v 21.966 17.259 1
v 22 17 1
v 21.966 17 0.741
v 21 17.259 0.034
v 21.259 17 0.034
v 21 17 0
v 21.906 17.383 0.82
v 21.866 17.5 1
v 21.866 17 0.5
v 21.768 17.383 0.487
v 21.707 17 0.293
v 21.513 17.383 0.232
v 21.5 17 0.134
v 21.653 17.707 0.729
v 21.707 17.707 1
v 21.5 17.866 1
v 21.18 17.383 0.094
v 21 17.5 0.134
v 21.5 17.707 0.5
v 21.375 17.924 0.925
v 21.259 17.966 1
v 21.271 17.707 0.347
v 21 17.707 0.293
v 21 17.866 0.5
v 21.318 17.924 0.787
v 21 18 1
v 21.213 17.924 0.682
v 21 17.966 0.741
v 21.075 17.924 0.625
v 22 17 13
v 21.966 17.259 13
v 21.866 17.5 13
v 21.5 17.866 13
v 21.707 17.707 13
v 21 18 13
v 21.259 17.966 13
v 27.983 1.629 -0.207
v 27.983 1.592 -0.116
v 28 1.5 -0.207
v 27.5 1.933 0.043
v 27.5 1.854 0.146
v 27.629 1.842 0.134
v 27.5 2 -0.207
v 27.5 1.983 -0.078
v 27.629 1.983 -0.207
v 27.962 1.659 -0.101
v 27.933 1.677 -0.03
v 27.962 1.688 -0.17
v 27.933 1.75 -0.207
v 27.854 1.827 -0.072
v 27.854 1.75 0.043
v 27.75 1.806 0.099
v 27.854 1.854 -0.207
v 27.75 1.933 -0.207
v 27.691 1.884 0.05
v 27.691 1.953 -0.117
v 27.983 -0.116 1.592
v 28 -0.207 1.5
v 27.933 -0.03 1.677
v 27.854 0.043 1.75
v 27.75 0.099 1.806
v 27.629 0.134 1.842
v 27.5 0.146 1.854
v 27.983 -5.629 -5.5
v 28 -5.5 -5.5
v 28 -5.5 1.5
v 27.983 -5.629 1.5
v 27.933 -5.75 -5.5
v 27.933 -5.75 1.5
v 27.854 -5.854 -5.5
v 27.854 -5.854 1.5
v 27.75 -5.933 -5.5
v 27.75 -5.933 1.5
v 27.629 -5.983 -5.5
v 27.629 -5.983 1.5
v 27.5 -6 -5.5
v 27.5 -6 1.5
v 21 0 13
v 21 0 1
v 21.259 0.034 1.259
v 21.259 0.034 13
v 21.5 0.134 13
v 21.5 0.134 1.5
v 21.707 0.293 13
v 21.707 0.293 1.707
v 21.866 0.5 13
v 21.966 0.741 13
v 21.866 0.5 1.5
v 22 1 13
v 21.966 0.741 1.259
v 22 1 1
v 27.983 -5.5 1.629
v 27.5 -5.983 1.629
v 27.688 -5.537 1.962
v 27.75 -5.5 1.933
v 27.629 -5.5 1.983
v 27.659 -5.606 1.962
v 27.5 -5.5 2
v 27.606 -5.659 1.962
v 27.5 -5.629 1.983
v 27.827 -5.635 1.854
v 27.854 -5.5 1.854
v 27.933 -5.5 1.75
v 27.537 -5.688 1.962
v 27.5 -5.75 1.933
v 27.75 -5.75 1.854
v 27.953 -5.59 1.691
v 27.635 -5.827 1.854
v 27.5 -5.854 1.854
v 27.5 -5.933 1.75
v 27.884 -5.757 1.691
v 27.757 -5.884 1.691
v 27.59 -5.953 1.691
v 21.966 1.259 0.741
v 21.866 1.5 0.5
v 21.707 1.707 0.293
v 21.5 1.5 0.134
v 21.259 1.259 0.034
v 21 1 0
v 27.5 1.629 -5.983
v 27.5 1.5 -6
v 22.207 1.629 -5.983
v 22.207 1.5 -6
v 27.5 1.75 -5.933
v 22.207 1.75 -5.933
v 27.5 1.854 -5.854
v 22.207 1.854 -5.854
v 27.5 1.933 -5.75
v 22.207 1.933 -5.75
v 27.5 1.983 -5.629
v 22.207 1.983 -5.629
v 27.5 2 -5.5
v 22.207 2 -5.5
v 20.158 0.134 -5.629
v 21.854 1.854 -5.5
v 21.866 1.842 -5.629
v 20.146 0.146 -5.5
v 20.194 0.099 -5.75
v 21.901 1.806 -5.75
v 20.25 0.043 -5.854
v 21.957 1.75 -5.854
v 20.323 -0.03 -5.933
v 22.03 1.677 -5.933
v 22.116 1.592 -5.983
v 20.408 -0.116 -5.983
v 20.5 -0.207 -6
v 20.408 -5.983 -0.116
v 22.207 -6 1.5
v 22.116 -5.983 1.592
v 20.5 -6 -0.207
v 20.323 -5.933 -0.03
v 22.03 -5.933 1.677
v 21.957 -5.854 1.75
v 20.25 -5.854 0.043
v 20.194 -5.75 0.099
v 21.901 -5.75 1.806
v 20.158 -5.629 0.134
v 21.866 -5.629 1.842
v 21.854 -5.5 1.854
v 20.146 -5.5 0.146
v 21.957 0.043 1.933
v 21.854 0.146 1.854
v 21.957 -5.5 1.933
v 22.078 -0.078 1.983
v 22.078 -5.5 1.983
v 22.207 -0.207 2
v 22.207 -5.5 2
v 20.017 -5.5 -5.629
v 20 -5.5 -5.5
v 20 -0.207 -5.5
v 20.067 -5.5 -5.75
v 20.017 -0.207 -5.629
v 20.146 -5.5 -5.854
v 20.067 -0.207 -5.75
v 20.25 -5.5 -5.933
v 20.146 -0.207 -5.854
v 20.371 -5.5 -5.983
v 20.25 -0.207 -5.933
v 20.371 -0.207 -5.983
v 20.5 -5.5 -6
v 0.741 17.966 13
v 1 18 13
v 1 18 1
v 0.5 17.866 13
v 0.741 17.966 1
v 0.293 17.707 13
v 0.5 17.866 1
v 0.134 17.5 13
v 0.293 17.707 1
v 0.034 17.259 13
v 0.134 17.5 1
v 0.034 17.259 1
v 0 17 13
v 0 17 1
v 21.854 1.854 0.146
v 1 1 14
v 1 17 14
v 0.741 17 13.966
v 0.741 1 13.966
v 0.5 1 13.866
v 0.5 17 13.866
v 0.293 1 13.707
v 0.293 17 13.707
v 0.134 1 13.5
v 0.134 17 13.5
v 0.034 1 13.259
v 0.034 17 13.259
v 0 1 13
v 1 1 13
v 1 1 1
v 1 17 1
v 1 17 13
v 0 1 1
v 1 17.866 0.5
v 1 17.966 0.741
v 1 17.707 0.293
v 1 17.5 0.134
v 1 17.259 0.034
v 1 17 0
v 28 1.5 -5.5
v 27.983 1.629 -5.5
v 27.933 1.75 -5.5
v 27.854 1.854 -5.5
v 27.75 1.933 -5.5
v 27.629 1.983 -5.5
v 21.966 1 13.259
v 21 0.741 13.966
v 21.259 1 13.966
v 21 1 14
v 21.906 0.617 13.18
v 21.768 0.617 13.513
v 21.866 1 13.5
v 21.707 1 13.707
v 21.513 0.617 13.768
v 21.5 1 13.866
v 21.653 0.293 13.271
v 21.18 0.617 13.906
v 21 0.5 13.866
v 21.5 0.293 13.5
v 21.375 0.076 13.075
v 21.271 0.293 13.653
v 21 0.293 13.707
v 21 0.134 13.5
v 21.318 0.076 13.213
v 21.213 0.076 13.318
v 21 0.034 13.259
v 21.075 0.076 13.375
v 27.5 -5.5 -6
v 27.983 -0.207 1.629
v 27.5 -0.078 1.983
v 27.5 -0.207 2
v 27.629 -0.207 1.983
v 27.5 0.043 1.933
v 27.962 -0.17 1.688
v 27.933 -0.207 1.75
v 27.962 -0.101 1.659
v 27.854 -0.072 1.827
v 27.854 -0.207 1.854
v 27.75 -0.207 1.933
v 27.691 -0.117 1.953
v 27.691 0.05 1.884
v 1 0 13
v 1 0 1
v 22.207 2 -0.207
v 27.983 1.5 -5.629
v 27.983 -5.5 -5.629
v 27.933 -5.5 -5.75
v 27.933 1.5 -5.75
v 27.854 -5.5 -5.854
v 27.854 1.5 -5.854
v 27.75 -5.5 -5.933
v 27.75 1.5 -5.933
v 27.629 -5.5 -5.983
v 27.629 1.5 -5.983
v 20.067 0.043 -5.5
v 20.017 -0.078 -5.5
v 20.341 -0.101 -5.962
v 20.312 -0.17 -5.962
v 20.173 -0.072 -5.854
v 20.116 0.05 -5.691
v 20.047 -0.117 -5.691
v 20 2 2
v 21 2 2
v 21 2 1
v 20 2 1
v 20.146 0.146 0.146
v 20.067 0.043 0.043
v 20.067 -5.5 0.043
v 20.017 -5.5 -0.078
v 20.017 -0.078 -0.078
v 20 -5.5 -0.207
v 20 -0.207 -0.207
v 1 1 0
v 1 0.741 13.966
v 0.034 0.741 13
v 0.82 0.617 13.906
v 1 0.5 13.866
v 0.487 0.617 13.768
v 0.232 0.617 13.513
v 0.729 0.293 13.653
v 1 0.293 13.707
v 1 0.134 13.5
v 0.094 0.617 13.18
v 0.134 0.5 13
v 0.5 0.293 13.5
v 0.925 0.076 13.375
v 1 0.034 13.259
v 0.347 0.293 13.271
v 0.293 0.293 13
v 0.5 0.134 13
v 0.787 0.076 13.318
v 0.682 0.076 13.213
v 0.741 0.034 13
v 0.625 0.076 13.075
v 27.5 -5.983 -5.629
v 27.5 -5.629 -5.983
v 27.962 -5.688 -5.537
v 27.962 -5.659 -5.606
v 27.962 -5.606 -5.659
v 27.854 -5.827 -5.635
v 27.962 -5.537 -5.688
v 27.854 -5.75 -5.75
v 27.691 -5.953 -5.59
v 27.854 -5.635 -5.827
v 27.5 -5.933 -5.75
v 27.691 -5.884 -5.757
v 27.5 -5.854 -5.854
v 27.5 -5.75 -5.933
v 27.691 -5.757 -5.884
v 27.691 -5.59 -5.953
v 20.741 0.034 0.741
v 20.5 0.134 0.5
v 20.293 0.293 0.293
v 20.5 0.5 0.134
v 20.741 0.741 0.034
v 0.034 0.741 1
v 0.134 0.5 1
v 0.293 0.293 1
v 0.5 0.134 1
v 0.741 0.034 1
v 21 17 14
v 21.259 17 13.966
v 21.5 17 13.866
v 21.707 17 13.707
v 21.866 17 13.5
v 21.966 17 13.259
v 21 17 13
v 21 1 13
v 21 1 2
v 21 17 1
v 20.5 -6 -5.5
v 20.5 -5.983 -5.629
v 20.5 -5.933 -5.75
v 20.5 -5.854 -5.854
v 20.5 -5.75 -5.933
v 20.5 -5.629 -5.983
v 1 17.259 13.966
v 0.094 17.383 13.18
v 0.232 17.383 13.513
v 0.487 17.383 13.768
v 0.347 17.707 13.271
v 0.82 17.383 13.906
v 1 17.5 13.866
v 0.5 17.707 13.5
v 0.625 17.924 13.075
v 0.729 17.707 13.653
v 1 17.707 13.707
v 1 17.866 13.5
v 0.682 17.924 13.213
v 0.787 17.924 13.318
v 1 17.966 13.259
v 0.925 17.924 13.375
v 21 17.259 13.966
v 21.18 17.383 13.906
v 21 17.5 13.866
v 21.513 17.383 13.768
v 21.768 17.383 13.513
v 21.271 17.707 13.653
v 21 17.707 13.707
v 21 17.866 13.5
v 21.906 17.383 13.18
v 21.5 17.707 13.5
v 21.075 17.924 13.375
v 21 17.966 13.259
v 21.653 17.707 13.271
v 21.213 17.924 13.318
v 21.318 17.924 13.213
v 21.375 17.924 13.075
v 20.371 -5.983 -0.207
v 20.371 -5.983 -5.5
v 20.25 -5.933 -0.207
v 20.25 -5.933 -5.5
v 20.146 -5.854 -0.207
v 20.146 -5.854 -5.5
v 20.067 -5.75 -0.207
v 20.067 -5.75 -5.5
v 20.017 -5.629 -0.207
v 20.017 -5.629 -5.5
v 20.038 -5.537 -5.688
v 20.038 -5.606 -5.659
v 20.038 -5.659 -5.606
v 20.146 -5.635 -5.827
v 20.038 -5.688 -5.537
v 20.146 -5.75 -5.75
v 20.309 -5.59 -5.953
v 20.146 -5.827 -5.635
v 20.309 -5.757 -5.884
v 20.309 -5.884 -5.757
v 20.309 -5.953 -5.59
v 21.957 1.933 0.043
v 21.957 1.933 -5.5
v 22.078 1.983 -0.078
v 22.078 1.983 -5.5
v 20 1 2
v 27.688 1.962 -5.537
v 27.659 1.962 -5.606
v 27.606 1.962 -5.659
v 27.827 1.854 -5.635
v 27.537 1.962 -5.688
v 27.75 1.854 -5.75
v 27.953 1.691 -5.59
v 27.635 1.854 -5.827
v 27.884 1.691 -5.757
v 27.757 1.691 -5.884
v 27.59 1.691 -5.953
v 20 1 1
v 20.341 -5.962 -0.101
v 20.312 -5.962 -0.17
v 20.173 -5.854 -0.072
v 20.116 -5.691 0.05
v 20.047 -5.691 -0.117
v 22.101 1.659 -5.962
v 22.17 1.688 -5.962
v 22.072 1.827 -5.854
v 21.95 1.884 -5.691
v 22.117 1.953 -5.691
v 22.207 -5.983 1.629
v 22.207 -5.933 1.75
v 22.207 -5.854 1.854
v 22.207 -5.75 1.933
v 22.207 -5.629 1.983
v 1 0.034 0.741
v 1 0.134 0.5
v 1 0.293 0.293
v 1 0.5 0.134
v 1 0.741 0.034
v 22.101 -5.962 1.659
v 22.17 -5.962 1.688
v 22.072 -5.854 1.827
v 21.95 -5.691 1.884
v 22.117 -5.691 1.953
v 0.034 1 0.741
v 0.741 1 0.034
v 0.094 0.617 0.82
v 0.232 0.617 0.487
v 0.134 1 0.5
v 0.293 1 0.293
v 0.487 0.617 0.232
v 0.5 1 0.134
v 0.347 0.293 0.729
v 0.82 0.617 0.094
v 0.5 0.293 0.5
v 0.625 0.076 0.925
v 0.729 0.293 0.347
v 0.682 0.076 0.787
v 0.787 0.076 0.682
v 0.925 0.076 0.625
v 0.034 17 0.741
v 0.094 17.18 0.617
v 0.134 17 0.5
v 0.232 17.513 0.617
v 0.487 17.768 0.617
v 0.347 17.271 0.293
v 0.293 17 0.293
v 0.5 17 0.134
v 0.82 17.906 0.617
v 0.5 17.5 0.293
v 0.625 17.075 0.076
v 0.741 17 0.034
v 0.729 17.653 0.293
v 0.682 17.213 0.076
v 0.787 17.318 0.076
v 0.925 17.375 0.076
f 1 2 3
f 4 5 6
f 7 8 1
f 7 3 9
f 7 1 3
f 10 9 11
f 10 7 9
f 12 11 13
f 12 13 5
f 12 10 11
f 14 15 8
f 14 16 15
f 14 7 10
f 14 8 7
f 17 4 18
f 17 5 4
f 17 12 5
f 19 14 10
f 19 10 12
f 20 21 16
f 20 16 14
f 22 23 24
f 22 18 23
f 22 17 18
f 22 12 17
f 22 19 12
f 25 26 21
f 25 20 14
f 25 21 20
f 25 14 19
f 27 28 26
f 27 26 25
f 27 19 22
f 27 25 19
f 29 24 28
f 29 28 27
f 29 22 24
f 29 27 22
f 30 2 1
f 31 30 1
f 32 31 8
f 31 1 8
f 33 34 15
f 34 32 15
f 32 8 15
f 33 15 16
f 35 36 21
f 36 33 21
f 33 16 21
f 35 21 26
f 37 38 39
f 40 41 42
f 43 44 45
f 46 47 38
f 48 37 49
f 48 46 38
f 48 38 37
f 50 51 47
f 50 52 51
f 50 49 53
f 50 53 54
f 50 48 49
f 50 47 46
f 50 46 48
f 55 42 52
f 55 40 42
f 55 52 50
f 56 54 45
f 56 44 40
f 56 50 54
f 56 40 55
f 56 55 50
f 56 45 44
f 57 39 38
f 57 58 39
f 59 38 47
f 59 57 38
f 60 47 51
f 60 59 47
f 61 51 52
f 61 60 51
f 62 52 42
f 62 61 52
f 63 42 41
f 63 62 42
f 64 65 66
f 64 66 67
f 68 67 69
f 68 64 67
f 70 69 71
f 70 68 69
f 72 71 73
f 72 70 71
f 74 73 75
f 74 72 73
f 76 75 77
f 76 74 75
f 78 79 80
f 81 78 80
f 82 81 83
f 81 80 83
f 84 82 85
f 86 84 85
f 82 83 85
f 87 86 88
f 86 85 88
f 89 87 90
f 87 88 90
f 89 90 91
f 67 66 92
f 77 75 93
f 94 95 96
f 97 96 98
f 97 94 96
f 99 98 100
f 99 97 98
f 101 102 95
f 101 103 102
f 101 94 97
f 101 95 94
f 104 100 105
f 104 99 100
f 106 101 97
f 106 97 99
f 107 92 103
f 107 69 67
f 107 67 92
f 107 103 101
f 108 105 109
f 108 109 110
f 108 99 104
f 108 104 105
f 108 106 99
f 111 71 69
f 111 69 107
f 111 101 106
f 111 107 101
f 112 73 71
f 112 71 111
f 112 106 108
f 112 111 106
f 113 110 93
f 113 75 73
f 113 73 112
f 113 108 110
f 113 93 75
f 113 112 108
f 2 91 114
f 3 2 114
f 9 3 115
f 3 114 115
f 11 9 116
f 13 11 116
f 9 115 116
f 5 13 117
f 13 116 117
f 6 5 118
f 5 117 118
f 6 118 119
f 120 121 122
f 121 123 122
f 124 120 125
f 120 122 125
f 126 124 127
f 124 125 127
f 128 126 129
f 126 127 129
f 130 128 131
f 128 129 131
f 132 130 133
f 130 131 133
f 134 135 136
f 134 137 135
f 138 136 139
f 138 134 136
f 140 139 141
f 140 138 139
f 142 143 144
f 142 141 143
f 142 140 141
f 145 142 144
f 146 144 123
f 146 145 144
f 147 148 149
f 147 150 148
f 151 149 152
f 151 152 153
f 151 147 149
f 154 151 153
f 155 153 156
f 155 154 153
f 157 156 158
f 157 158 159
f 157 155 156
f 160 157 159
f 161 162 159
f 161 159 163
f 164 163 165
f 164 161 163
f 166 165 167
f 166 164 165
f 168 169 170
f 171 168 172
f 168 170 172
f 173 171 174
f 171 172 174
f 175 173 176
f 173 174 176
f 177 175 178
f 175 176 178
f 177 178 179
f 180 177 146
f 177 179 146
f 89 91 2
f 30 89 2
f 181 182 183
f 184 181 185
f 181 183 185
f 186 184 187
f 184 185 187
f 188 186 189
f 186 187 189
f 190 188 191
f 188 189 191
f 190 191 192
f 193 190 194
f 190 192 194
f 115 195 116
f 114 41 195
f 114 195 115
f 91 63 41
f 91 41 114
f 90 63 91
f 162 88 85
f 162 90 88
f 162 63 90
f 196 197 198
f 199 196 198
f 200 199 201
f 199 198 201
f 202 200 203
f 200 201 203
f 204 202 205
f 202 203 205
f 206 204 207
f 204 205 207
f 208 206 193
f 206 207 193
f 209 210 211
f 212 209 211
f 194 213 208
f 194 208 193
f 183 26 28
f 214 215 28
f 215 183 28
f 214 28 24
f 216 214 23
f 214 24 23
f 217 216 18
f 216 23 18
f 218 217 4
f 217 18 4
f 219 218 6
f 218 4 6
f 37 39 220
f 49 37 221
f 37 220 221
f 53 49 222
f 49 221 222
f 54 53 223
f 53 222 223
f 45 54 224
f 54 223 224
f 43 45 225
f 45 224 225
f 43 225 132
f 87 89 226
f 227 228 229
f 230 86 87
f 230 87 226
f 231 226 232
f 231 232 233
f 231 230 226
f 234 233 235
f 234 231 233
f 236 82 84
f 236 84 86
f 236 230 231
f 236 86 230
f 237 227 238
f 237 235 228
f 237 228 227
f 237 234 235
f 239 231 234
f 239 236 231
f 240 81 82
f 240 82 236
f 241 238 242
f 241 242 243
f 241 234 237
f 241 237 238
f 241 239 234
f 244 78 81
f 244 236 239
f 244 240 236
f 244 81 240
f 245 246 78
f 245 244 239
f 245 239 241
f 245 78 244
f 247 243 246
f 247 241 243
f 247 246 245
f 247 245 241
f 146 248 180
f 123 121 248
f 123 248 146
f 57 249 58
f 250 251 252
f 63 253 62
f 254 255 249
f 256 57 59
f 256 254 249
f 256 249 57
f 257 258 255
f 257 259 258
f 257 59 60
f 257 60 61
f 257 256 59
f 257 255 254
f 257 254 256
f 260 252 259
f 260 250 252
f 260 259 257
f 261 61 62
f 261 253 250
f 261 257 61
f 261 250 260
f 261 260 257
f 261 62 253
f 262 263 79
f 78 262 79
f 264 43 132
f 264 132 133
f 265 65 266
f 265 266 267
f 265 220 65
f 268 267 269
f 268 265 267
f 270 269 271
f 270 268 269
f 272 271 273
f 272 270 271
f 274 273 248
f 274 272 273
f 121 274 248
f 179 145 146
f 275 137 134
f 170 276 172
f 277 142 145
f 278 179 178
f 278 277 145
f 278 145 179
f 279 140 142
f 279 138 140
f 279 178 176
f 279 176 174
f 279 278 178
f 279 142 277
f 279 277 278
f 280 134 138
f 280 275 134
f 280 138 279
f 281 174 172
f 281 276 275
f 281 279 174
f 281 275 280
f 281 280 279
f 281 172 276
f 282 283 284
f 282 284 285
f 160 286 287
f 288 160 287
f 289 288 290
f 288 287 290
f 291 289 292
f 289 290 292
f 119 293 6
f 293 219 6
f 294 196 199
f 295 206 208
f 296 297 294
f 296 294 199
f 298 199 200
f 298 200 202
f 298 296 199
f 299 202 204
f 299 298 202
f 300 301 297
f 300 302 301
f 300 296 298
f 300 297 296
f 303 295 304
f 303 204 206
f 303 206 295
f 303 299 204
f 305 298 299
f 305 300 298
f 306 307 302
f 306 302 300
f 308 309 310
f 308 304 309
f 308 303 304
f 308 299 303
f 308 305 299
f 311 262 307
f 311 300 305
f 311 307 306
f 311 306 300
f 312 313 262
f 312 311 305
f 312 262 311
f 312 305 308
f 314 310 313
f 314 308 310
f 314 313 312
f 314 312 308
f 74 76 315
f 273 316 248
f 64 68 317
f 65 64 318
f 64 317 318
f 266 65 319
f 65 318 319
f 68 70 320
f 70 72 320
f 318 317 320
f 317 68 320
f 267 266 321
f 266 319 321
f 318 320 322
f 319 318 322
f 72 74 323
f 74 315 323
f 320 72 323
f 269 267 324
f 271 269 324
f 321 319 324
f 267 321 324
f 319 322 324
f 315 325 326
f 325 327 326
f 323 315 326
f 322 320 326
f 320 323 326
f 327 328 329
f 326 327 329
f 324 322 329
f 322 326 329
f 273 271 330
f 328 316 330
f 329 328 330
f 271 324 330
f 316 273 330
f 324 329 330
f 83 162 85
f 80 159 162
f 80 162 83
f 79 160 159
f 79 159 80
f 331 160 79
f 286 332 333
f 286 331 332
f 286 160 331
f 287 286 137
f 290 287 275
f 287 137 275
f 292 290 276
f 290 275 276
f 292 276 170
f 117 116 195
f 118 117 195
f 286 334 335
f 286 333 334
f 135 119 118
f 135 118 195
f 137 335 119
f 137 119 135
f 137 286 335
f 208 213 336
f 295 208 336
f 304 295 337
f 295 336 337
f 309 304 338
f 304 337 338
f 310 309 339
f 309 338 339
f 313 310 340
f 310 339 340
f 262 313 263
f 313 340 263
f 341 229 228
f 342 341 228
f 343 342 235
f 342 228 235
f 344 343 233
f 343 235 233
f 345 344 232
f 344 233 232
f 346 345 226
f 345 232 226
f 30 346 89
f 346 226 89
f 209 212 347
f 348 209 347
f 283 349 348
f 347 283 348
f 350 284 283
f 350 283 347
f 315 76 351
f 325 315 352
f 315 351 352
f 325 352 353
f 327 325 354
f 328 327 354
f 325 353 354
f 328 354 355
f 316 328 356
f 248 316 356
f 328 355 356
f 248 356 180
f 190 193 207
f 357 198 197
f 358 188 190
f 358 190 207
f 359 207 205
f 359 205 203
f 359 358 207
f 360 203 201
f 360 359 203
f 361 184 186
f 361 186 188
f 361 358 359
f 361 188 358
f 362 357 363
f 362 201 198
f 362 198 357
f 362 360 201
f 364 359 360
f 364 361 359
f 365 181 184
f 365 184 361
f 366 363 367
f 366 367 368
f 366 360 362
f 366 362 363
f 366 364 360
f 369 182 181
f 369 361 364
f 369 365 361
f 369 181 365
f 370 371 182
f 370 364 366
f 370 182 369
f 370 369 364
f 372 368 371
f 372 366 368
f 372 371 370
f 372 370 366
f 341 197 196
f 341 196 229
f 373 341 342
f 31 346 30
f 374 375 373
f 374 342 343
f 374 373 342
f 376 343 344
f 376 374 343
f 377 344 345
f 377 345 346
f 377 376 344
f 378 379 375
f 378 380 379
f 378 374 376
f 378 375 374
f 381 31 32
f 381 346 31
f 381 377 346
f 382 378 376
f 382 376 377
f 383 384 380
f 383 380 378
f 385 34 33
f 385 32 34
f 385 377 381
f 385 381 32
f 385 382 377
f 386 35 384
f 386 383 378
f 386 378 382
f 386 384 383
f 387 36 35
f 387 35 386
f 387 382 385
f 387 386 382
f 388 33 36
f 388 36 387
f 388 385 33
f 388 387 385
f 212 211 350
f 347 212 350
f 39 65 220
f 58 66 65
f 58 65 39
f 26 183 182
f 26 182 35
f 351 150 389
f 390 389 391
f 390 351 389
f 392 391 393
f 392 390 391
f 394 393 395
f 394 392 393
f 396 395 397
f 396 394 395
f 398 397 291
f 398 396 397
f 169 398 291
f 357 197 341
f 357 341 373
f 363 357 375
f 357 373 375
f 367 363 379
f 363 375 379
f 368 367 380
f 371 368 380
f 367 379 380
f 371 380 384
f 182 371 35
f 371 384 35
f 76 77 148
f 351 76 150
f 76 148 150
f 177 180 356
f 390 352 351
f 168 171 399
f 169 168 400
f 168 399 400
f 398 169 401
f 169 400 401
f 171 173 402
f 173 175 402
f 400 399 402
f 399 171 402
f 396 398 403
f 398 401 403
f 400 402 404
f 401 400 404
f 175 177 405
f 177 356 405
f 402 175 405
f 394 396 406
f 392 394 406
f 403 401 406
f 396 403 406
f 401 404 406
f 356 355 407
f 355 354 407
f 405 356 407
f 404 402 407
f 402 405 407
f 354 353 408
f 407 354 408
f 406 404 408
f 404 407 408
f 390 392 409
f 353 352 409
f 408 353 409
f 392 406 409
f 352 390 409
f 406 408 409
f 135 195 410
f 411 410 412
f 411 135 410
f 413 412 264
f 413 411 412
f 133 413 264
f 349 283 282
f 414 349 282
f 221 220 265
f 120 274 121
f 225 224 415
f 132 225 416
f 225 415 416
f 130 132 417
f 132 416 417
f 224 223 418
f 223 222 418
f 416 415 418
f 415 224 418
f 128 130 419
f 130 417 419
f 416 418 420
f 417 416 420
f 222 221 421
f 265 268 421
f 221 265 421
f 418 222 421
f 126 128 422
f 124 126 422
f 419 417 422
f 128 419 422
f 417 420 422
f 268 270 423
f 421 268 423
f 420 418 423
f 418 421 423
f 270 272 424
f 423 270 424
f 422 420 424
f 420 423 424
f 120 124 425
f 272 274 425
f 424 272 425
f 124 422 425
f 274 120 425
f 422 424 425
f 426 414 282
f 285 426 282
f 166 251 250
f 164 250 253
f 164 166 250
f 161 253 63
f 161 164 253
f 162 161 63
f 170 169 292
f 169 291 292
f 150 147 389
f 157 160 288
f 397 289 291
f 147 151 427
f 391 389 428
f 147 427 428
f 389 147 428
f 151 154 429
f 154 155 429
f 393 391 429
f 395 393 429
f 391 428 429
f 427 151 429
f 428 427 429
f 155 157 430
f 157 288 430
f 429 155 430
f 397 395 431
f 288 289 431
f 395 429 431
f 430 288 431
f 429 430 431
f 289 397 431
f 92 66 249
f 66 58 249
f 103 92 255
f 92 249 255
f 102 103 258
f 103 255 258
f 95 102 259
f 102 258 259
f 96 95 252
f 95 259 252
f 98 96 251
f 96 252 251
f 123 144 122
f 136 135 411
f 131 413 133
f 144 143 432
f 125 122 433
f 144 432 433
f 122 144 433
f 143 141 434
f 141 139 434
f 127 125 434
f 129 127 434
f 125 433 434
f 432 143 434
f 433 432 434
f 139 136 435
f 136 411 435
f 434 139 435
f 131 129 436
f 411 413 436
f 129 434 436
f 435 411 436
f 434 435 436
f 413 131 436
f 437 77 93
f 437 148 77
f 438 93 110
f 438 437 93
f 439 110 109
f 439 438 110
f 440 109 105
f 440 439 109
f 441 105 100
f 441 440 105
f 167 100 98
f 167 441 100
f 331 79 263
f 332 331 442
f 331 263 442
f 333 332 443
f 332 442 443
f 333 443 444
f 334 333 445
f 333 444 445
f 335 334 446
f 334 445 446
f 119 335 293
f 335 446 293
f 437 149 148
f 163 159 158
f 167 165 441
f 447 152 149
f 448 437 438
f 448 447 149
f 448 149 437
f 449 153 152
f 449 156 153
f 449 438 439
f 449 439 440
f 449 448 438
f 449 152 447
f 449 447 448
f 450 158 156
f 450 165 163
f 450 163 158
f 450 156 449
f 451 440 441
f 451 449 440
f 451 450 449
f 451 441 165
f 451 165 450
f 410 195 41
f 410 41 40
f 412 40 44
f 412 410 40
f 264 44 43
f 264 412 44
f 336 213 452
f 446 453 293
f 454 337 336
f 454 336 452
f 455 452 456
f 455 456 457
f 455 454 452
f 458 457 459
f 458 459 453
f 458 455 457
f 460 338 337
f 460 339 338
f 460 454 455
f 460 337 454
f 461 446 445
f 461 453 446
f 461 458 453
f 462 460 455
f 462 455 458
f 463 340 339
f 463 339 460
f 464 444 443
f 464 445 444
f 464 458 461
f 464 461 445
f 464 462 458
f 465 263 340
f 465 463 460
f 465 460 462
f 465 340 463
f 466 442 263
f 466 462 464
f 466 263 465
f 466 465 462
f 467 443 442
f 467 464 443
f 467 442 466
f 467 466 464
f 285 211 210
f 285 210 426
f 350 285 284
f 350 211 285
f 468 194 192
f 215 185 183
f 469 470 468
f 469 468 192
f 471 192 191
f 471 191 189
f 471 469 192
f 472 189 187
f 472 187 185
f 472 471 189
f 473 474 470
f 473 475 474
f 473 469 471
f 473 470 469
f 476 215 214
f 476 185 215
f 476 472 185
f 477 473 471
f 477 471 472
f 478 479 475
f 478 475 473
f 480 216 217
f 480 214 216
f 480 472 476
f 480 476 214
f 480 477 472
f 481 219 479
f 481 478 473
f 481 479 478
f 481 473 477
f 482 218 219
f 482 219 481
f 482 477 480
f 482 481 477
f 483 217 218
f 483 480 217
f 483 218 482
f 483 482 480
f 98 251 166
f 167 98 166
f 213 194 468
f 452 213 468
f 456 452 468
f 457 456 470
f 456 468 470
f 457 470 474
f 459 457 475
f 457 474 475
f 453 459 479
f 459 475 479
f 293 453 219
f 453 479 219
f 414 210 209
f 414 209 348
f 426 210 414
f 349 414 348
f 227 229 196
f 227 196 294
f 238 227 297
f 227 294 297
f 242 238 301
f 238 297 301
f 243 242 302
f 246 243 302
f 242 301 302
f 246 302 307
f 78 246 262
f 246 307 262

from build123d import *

# Parameters (mm, degrees)
SKETCH1_W                = 22
SKETCH1_H                = 18
BOSS_EXTRUDE1_DEPTH      = 14
SHELL1_T                 = 1
BOSS_EXTRUDE3_DEPTH      = 6
BOSS_EXTRUDE3_DEPTH_BACK = 2
SKETCH2_W                = 8
SKETCH2_H                = 8
CHAMFER2_SIZE            = 2
FILLET1_R                = 1
FILLET2_R                = 0.5


with BuildPart() as part:
    # Sketch1 → Boss-Extrude1 (new body)
    with BuildSketch(Plane.XY):
        with Locations((11, 9)):
            Rectangle(SKETCH1_W, SKETCH1_H)
    extrude(amount=BOSS_EXTRUDE1_DEPTH)

    # Shell1 (no face opened: a closed hollow body)
    add(offset(amount=-SHELL1_T, mode=Mode.PRIVATE), mode=Mode.SUBTRACT)

    # Sketch2 → Boss-Extrude3 (add, two sides: drawn at the far end of the back side and taken through both)
    with BuildSketch(Plane(origin=(0, 0, 0), x_dir=(-1, 0, 0), z_dir=(0, 0, -1)).offset(-BOSS_EXTRUDE3_DEPTH_BACK)):
        with Locations((-24, -2)):
            Rectangle(SKETCH2_W, SKETCH2_H)
    extrude(amount=BOSS_EXTRUDE3_DEPTH + BOSS_EXTRUDE3_DEPTH_BACK)

    # Chamfer2
    chamfer2_edges = [part.edges().sort_by_distance(p)[0] for p in [
        (20, -3, 2),
        (20, 2, -3),
        (25, 2, 2),
    ]]
    chamfer(chamfer2_edges, length=CHAMFER2_SIZE)

    # Fillet1
    # the kernel refuses this fillet: 1 mm, written as the material it takes off along each edge
    with BuildSketch(Plane(origin=(1, 17, 1), x_dir=(0, 1, 0), z_dir=(0, 0, -1))) as fillet1_piece_1_section:
        Polygon((0, 0), (FILLET1_R, 0), (FILLET1_R, -FILLET1_R), (0, -FILLET1_R), align=None)
    fillet1_piece_1 = extrude(amount=FILLET1_R, mode=Mode.PRIVATE)
    fillet1_piece_1 = fillet1_piece_1 - Plane(origin=(1, 17, 1), x_dir=(0.7071067811865476, -0.7071067811865474, 0), z_dir=(0, 0, -1)) * Sphere(FILLET1_R, mode=Mode.PRIVATE)
    add(fillet1_piece_1, mode=Mode.SUBTRACT)
    with BuildSketch(Plane(origin=(1, 1, 1), x_dir=(0, 0, -1), z_dir=(0, -1, 0))) as fillet1_piece_2_section:
        Polygon((0, 0), (FILLET1_R, 0), (FILLET1_R, -FILLET1_R), (0, -FILLET1_R), align=None)
    fillet1_piece_2 = extrude(amount=FILLET1_R, mode=Mode.PRIVATE)
    fillet1_piece_2 = fillet1_piece_2 - Plane(origin=(1, 1, 1), x_dir=(0.7071067811865475, 0, 0.7071067811865475), z_dir=(0, -1, 0)) * Sphere(FILLET1_R, mode=Mode.PRIVATE)
    add(fillet1_piece_2, mode=Mode.SUBTRACT)
    with BuildSketch(Plane(origin=(21, 17, 1), x_dir=(0, 0, -1), z_dir=(0, 1, 0))) as fillet1_piece_3_section:
        Polygon((0, 0), (FILLET1_R, 0), (FILLET1_R, -FILLET1_R), (0, -FILLET1_R), align=None)
    fillet1_piece_3 = extrude(amount=FILLET1_R, mode=Mode.PRIVATE)
    fillet1_piece_3 = fillet1_piece_3 - Plane(origin=(21, 17, 1), x_dir=(-0.7071067811865475, 0, 0.7071067811865475), z_dir=(0, 1, 0)) * Sphere(FILLET1_R, mode=Mode.PRIVATE)
    add(fillet1_piece_3, mode=Mode.SUBTRACT)
    with BuildSketch(Plane(origin=(1, 1, 13), x_dir=(-1, 0, 0), z_dir=(0, -1, 0))) as fillet1_piece_4_section:
        Polygon((0, 0), (FILLET1_R, 0), (FILLET1_R, -FILLET1_R), (0, -FILLET1_R), align=None)
    fillet1_piece_4 = extrude(amount=FILLET1_R, mode=Mode.PRIVATE)
    fillet1_piece_4 = fillet1_piece_4 - Plane(origin=(1, 1, 13), x_dir=(0.7071067811865475, 0, -0.7071067811865475), z_dir=(0, -1, 0)) * Sphere(FILLET1_R, mode=Mode.PRIVATE)
    add(fillet1_piece_4, mode=Mode.SUBTRACT)
    with BuildSketch(Plane(origin=(21, 1, 13), x_dir=(1, 0, 0), z_dir=(0, -1, 0))) as fillet1_piece_5_section:
        Polygon((0, 0), (FILLET1_R, 0), (FILLET1_R, FILLET1_R), (0, FILLET1_R), align=None)
    fillet1_piece_5 = extrude(amount=FILLET1_R, mode=Mode.PRIVATE)
    fillet1_piece_5 = fillet1_piece_5 - Plane(origin=(21, 1, 13), x_dir=(-0.7071067811865475, 0, -0.7071067811865475), z_dir=(0, -1, 0)) * Sphere(FILLET1_R, mode=Mode.PRIVATE)
    add(fillet1_piece_5, mode=Mode.SUBTRACT)
    with BuildSketch(Plane(origin=(21, 17, 13), x_dir=(1, 0, 0), z_dir=(0, 1, 0))) as fillet1_piece_6_section:
        Polygon((0, 0), (FILLET1_R, 0), (FILLET1_R, -FILLET1_R), (0, -FILLET1_R), align=None)
    fillet1_piece_6 = extrude(amount=FILLET1_R, mode=Mode.PRIVATE)
    fillet1_piece_6 = fillet1_piece_6 - Plane(origin=(21, 17, 13), x_dir=(-0.7071067811865475, 0, -0.7071067811865475), z_dir=(0, 1, 0)) * Sphere(FILLET1_R, mode=Mode.PRIVATE)
    add(fillet1_piece_6, mode=Mode.SUBTRACT)
    with BuildSketch(Plane(origin=(1, 17, 13), x_dir=(-1, 0, 0), z_dir=(0, 1, 0))) as fillet1_piece_7_section:
        Polygon((0, 0), (FILLET1_R, 0), (FILLET1_R, FILLET1_R), (0, FILLET1_R), align=None)
    fillet1_piece_7 = extrude(amount=FILLET1_R, mode=Mode.PRIVATE)
    fillet1_piece_7 = fillet1_piece_7 - Plane(origin=(1, 17, 13), x_dir=(0.7071067811865475, 0, -0.7071067811865475), z_dir=(0, 1, 0)) * Sphere(FILLET1_R, mode=Mode.PRIVATE)
    add(fillet1_piece_7, mode=Mode.SUBTRACT)
    with BuildSketch(Plane(origin=(0, 17, 0), x_dir=(1, 0, 0), z_dir=(0, -1, 0)), Plane(origin=(22, 1, 14), x_dir=(0, 0, -1), z_dir=(0, 1, 0)), Plane(origin=(0, 17, 14), x_dir=(0, 0, -1), z_dir=(0, -1, 0))) as fillet1_piece_8:
        with BuildLine():
            CenterArc((FILLET1_R, FILLET1_R), FILLET1_R, 180, 90)
            Line((0, FILLET1_R), (0, 0))
            Line((0, 0), (FILLET1_R, 0))
        make_face()
    extrude(amount=16, mode=Mode.SUBTRACT)
    with BuildSketch(Plane(origin=(1, 0, 0), x_dir=(0, 0, 1), z_dir=(1, 0, 0))) as fillet1_piece_9_section:
        with BuildLine():
            CenterArc((FILLET1_R, -FILLET1_R), FILLET1_R, 90, 90)
            Line((0, -FILLET1_R), (0, 0))
            Line((0, 0), (FILLET1_R, 0))
        make_face()
    fillet1_piece_9 = extrude(amount=21.5, mode=Mode.PRIVATE)
    fillet1_piece_9 = split(fillet1_piece_9, bisect_by=Plane(origin=(15.381840504, 0.226418621, -4.618159496), z_dir=(-0.7071067811865476, 0, 0.7071067811865476)), keep=Keep.TOP, mode=Mode.PRIVATE)
    fillet1_piece_9 = split(fillet1_piece_9, bisect_by=Plane(origin=(15.381840504, -4.618159496, 0.226418621), z_dir=(-0.7071067811865476, 0.7071067811865476, 0)), keep=Keep.TOP, mode=Mode.PRIVATE)
    add(fillet1_piece_9, mode=Mode.SUBTRACT)
    with BuildSketch(Plane(origin=(1, 0, 0), x_dir=(0, 0, 1), z_dir=(1, 0, 0))) as fillet1_piece_10_section:
        with BuildLine():
            CenterArc((FILLET1_R, -FILLET1_R), FILLET1_R, 90, 90)
            Line((0, -FILLET1_R), (0, 0))
            Line((0, 0), (FILLET1_R, 0))
        make_face()
    fillet1_piece_10 = extrude(amount=21.5, mode=Mode.PRIVATE)
    fillet1_piece_10 = split(fillet1_piece_10, bisect_by=Plane(origin=(20.16446835, 0.528927527, 0.16446835), z_dir=(0.7071067811865476, 0, -0.7071067811865476)), keep=Keep.TOP, mode=Mode.PRIVATE)
    fillet1_piece_10 = split(fillet1_piece_10, bisect_by=Plane(origin=(20.407441135, 0.407441135, 0.042981958), z_dir=(-0.7071067811865476, 0.7071067811865476, 0)), keep=Keep.TOP, mode=Mode.PRIVATE)
    add(fillet1_piece_10, mode=Mode.SUBTRACT)
    with BuildSketch(Plane(origin=(1, 0, 0), x_dir=(0, 0, 1), z_dir=(1, 0, 0))) as fillet1_piece_11_section:
        with BuildLine():
            CenterArc((FILLET1_R, -FILLET1_R), FILLET1_R, 90, 90)
            Line((0, -FILLET1_R), (0, 0))
            Line((0, 0), (FILLET1_R, 0))
        make_face()
    fillet1_piece_11 = extrude(amount=21.5, mode=Mode.PRIVATE)
    fillet1_piece_11 = split(fillet1_piece_11, bisect_by=Plane(origin=(20.407441135, 0.042981958, 0.407441135), z_dir=(-0.7071067811865476, 0, 0.7071067811865476)), keep=Keep.TOP, mode=Mode.PRIVATE)
    fillet1_piece_11 = split(fillet1_piece_11, bisect_by=Plane(origin=(20.16446835, 0.16446835, 0.528927527), z_dir=(0.7071067811865476, -0.7071067811865476, 0)), keep=Keep.TOP, mode=Mode.PRIVATE)
    add(fillet1_piece_11, mode=Mode.SUBTRACT)
    with BuildSketch(Plane(origin=(22, -0.5, 0), x_dir=(-1, 0, 0), z_dir=(0, 1, 0))) as fillet1_piece_12_section:
        with BuildLine():
            CenterArc((FILLET1_R, FILLET1_R), FILLET1_R, 180, 90)
            Line((0, FILLET1_R), (0, 0))
            Line((0, 0), (FILLET1_R, 0))
        make_face()
    fillet1_piece_12 = extrude(amount=17.5, mode=Mode.PRIVATE)
    fillet1_piece_12 = split(fillet1_piece_12, bisect_by=Plane(origin=(21.83553165, 1.83553165, 0.528927527), z_dir=(0.7071067811865476, -0.7071067811865476, 0)), keep=Keep.TOP, mode=Mode.PRIVATE)
    fillet1_piece_12 = split(fillet1_piece_12, bisect_by=Plane(origin=(21.957018042, 1.592558865, 0.407441135), z_dir=(0, 0.7071067811865476, 0.7071067811865476)), keep=Keep.TOP, mode=Mode.PRIVATE)
    add(fillet1_piece_12, mode=Mode.SUBTRACT)
    with BuildSketch(Plane(origin=(22, -0.5, 0), x_dir=(-1, 0, 0), z_dir=(0, 1, 0))) as fillet1_piece_13_section:
        with BuildLine():
            CenterArc((FILLET1_R, FILLET1_R), FILLET1_R, 180, 90)
            Line((0, FILLET1_R), (0, 0))
            Line((0, 0), (FILLET1_R, 0))
        make_face()
    fillet1_piece_13 = extrude(amount=17.5, mode=Mode.PRIVATE)
    fillet1_piece_13 = split(fillet1_piece_13, bisect_by=Plane(origin=(21.592558865, 1.592558865, 0.042981958), z_dir=(-0.7071067811865476, 0.7071067811865476, 0)), keep=Keep.TOP, mode=Mode.PRIVATE)
    fillet1_piece_13 = split(fillet1_piece_13, bisect_by=Plane(origin=(21.471072473, 1.83553165, 0.16446835), z_dir=(0, -0.7071067811865476, -0.7071067811865476)), keep=Keep.TOP, mode=Mode.PRIVATE)
    add(fillet1_piece_13, mode=Mode.SUBTRACT)
    with BuildSketch(Plane(origin=(22, -0.5, 0), x_dir=(-1, 0, 0), z_dir=(0, 1, 0))) as fillet1_piece_14_section:
        with BuildLine():
            CenterArc((FILLET1_R, FILLET1_R), FILLET1_R, 180, 90)
            Line((0, FILLET1_R), (0, 0))
            Line((0, 0), (FILLET1_R, 0))
        make_face()
    fillet1_piece_14 = extrude(amount=17.5, mode=Mode.PRIVATE)
    fillet1_piece_14 = split(fillet1_piece_14, bisect_by=Plane(origin=(25.618138272, 5.618138272, 0.226424858), z_dir=(-0.7071067811865476, 0.7071067811865476, 0)), keep=Keep.TOP, mode=Mode.PRIVATE)
    fillet1_piece_14 = split(fillet1_piece_14, bisect_by=Plane(origin=(21.773575142, 5.618138272, -3.618138272), z_dir=(0, 0.7071067811865476, 0.7071067811865476)), keep=Keep.TOP, mode=Mode.PRIVATE)
    add(fillet1_piece_14, mode=Mode.SUBTRACT)
    with BuildSketch(Plane(origin=(21, 18, 0), x_dir=(0, -1, 0), z_dir=(-1, 0, 0)), Plane(origin=(1, 0, 14), x_dir=(0, 0, -1), z_dir=(1, 0, 0))) as fillet1_piece_15:
        with BuildLine():
            CenterArc((FILLET1_R, FILLET1_R), FILLET1_R, 180, 90)
            Line((0, FILLET1_R), (0, 0))
            Line((0, 0), (FILLET1_R, 0))
        make_face()
    extrude(amount=20, mode=Mode.SUBTRACT)
    with BuildSketch(Plane(origin=(21, 18, 14), x_dir=(0, -1, 0), z_dir=(-1, 0, 0))) as fillet1_piece_16:
        with BuildLine():
            CenterArc((FILLET1_R, -FILLET1_R), FILLET1_R, 90, 90)
            Line((0, -FILLET1_R), (0, 0))
            Line((0, 0), (FILLET1_R, 0))
        make_face()
    extrude(amount=20, mode=Mode.SUBTRACT)
    with BuildSketch(Plane(origin=(0, 18, 1), x_dir=(0, -1, 0), z_dir=(0, 0, 1)), Plane(origin=(0, 0, 1), x_dir=(1, 0, 0), z_dir=(0, 0, 1))) as fillet1_piece_17:
        with BuildLine():
            CenterArc((FILLET1_R, FILLET1_R), FILLET1_R, 180, 90)
            Line((0, FILLET1_R), (0, 0))
            Line((0, 0), (FILLET1_R, 0))
        make_face()
    extrude(amount=12, mode=Mode.SUBTRACT)
    with BuildSketch(Plane(origin=(22, 18, 1), x_dir=(0, -1, 0), z_dir=(0, 0, 1))) as fillet1_piece_18:
        with BuildLine():
            CenterArc((FILLET1_R, -FILLET1_R), FILLET1_R, 90, 90)
            Line((0, -FILLET1_R), (0, 0))
            Line((0, 0), (FILLET1_R, 0))
        make_face()
    extrude(amount=12, mode=Mode.SUBTRACT)
    with BuildSketch(Plane(origin=(22, 0, -0.5), x_dir=(-1, 0, 0), z_dir=(0, 0, 1))) as fillet1_piece_19_section:
        with BuildLine():
            CenterArc((FILLET1_R, -FILLET1_R), FILLET1_R, 90, 90)
            Line((0, -FILLET1_R), (0, 0))
            Line((0, 0), (FILLET1_R, 0))
        make_face()
    fillet1_piece_19 = extrude(amount=13.5, mode=Mode.PRIVATE)
    fillet1_piece_19 = split(fillet1_piece_19, bisect_by=Plane(origin=(21.83553165, 0.528927527, 1.83553165), z_dir=(0.7071067811865476, 0, -0.7071067811865476)), keep=Keep.TOP, mode=Mode.PRIVATE)
    fillet1_piece_19 = split(fillet1_piece_19, bisect_by=Plane(origin=(21.957018042, 0.407441135, 1.592558865), z_dir=(0, 0.7071067811865476, 0.7071067811865476)), keep=Keep.TOP, mode=Mode.PRIVATE)
    add(fillet1_piece_19, mode=Mode.SUBTRACT)
    with BuildSketch(Plane(origin=(22, 0, -0.5), x_dir=(-1, 0, 0), z_dir=(0, 0, 1))) as fillet1_piece_20_section:
        with BuildLine():
            CenterArc((FILLET1_R, -FILLET1_R), FILLET1_R, 90, 90)
            Line((0, -FILLET1_R), (0, 0))
            Line((0, 0), (FILLET1_R, 0))
        make_face()
    fillet1_piece_20 = extrude(amount=13.5, mode=Mode.PRIVATE)
    fillet1_piece_20 = split(fillet1_piece_20, bisect_by=Plane(origin=(21.592558865, 0.042981958, 1.592558865), z_dir=(-0.7071067811865476, 0, 0.7071067811865476)), keep=Keep.TOP, mode=Mode.PRIVATE)
    fillet1_piece_20 = split(fillet1_piece_20, bisect_by=Plane(origin=(21.471072473, 0.16446835, 1.83553165), z_dir=(0, -0.7071067811865476, -0.7071067811865476)), keep=Keep.TOP, mode=Mode.PRIVATE)
    add(fillet1_piece_20, mode=Mode.SUBTRACT)
    with BuildSketch(Plane(origin=(22, 0, -0.5), x_dir=(-1, 0, 0), z_dir=(0, 0, 1))) as fillet1_piece_21_section:
        with BuildLine():
            CenterArc((FILLET1_R, -FILLET1_R), FILLET1_R, 90, 90)
            Line((0, -FILLET1_R), (0, 0))
            Line((0, 0), (FILLET1_R, 0))
        make_face()
    fillet1_piece_21 = extrude(amount=13.5, mode=Mode.PRIVATE)
    fillet1_piece_21 = split(fillet1_piece_21, bisect_by=Plane(origin=(24.618101716, 0.226435602, 4.618101716), z_dir=(-0.7071067811865476, 0, 0.7071067811865476)), keep=Keep.TOP, mode=Mode.PRIVATE)
    fillet1_piece_21 = split(fillet1_piece_21, bisect_by=Plane(origin=(21.773564398, -2.618101716, 4.618101716), z_dir=(0, 0.7071067811865476, 0.7071067811865476)), keep=Keep.TOP, mode=Mode.PRIVATE)
    add(fillet1_piece_21, mode=Mode.SUBTRACT)

    # Fillet2
    fillet2_edges = [part.edges().sort_by_distance(p)[0] for p in [
        (24, -6, -6),
        (28, -6, -2),
        (28, -2, -6),
        (28, 2, -3),
        (25, 2, -6),
        (22, 2, -3),
        (25, 2, 0),
        (28, -3, 2),
        (28, 1, 1),
        (25, -6, 2),
        (22, -3, 2),
        (25, 0, 2),
        (20, -3, -6),
        (20, -6, -3),
        (20, -3, 0),
        (20, 0, -3),
        (21, 1, -6),
        (21, -6, 1),
    ]]
    fillet(fillet2_edges, radius=FILLET2_R)


solid = part.part
